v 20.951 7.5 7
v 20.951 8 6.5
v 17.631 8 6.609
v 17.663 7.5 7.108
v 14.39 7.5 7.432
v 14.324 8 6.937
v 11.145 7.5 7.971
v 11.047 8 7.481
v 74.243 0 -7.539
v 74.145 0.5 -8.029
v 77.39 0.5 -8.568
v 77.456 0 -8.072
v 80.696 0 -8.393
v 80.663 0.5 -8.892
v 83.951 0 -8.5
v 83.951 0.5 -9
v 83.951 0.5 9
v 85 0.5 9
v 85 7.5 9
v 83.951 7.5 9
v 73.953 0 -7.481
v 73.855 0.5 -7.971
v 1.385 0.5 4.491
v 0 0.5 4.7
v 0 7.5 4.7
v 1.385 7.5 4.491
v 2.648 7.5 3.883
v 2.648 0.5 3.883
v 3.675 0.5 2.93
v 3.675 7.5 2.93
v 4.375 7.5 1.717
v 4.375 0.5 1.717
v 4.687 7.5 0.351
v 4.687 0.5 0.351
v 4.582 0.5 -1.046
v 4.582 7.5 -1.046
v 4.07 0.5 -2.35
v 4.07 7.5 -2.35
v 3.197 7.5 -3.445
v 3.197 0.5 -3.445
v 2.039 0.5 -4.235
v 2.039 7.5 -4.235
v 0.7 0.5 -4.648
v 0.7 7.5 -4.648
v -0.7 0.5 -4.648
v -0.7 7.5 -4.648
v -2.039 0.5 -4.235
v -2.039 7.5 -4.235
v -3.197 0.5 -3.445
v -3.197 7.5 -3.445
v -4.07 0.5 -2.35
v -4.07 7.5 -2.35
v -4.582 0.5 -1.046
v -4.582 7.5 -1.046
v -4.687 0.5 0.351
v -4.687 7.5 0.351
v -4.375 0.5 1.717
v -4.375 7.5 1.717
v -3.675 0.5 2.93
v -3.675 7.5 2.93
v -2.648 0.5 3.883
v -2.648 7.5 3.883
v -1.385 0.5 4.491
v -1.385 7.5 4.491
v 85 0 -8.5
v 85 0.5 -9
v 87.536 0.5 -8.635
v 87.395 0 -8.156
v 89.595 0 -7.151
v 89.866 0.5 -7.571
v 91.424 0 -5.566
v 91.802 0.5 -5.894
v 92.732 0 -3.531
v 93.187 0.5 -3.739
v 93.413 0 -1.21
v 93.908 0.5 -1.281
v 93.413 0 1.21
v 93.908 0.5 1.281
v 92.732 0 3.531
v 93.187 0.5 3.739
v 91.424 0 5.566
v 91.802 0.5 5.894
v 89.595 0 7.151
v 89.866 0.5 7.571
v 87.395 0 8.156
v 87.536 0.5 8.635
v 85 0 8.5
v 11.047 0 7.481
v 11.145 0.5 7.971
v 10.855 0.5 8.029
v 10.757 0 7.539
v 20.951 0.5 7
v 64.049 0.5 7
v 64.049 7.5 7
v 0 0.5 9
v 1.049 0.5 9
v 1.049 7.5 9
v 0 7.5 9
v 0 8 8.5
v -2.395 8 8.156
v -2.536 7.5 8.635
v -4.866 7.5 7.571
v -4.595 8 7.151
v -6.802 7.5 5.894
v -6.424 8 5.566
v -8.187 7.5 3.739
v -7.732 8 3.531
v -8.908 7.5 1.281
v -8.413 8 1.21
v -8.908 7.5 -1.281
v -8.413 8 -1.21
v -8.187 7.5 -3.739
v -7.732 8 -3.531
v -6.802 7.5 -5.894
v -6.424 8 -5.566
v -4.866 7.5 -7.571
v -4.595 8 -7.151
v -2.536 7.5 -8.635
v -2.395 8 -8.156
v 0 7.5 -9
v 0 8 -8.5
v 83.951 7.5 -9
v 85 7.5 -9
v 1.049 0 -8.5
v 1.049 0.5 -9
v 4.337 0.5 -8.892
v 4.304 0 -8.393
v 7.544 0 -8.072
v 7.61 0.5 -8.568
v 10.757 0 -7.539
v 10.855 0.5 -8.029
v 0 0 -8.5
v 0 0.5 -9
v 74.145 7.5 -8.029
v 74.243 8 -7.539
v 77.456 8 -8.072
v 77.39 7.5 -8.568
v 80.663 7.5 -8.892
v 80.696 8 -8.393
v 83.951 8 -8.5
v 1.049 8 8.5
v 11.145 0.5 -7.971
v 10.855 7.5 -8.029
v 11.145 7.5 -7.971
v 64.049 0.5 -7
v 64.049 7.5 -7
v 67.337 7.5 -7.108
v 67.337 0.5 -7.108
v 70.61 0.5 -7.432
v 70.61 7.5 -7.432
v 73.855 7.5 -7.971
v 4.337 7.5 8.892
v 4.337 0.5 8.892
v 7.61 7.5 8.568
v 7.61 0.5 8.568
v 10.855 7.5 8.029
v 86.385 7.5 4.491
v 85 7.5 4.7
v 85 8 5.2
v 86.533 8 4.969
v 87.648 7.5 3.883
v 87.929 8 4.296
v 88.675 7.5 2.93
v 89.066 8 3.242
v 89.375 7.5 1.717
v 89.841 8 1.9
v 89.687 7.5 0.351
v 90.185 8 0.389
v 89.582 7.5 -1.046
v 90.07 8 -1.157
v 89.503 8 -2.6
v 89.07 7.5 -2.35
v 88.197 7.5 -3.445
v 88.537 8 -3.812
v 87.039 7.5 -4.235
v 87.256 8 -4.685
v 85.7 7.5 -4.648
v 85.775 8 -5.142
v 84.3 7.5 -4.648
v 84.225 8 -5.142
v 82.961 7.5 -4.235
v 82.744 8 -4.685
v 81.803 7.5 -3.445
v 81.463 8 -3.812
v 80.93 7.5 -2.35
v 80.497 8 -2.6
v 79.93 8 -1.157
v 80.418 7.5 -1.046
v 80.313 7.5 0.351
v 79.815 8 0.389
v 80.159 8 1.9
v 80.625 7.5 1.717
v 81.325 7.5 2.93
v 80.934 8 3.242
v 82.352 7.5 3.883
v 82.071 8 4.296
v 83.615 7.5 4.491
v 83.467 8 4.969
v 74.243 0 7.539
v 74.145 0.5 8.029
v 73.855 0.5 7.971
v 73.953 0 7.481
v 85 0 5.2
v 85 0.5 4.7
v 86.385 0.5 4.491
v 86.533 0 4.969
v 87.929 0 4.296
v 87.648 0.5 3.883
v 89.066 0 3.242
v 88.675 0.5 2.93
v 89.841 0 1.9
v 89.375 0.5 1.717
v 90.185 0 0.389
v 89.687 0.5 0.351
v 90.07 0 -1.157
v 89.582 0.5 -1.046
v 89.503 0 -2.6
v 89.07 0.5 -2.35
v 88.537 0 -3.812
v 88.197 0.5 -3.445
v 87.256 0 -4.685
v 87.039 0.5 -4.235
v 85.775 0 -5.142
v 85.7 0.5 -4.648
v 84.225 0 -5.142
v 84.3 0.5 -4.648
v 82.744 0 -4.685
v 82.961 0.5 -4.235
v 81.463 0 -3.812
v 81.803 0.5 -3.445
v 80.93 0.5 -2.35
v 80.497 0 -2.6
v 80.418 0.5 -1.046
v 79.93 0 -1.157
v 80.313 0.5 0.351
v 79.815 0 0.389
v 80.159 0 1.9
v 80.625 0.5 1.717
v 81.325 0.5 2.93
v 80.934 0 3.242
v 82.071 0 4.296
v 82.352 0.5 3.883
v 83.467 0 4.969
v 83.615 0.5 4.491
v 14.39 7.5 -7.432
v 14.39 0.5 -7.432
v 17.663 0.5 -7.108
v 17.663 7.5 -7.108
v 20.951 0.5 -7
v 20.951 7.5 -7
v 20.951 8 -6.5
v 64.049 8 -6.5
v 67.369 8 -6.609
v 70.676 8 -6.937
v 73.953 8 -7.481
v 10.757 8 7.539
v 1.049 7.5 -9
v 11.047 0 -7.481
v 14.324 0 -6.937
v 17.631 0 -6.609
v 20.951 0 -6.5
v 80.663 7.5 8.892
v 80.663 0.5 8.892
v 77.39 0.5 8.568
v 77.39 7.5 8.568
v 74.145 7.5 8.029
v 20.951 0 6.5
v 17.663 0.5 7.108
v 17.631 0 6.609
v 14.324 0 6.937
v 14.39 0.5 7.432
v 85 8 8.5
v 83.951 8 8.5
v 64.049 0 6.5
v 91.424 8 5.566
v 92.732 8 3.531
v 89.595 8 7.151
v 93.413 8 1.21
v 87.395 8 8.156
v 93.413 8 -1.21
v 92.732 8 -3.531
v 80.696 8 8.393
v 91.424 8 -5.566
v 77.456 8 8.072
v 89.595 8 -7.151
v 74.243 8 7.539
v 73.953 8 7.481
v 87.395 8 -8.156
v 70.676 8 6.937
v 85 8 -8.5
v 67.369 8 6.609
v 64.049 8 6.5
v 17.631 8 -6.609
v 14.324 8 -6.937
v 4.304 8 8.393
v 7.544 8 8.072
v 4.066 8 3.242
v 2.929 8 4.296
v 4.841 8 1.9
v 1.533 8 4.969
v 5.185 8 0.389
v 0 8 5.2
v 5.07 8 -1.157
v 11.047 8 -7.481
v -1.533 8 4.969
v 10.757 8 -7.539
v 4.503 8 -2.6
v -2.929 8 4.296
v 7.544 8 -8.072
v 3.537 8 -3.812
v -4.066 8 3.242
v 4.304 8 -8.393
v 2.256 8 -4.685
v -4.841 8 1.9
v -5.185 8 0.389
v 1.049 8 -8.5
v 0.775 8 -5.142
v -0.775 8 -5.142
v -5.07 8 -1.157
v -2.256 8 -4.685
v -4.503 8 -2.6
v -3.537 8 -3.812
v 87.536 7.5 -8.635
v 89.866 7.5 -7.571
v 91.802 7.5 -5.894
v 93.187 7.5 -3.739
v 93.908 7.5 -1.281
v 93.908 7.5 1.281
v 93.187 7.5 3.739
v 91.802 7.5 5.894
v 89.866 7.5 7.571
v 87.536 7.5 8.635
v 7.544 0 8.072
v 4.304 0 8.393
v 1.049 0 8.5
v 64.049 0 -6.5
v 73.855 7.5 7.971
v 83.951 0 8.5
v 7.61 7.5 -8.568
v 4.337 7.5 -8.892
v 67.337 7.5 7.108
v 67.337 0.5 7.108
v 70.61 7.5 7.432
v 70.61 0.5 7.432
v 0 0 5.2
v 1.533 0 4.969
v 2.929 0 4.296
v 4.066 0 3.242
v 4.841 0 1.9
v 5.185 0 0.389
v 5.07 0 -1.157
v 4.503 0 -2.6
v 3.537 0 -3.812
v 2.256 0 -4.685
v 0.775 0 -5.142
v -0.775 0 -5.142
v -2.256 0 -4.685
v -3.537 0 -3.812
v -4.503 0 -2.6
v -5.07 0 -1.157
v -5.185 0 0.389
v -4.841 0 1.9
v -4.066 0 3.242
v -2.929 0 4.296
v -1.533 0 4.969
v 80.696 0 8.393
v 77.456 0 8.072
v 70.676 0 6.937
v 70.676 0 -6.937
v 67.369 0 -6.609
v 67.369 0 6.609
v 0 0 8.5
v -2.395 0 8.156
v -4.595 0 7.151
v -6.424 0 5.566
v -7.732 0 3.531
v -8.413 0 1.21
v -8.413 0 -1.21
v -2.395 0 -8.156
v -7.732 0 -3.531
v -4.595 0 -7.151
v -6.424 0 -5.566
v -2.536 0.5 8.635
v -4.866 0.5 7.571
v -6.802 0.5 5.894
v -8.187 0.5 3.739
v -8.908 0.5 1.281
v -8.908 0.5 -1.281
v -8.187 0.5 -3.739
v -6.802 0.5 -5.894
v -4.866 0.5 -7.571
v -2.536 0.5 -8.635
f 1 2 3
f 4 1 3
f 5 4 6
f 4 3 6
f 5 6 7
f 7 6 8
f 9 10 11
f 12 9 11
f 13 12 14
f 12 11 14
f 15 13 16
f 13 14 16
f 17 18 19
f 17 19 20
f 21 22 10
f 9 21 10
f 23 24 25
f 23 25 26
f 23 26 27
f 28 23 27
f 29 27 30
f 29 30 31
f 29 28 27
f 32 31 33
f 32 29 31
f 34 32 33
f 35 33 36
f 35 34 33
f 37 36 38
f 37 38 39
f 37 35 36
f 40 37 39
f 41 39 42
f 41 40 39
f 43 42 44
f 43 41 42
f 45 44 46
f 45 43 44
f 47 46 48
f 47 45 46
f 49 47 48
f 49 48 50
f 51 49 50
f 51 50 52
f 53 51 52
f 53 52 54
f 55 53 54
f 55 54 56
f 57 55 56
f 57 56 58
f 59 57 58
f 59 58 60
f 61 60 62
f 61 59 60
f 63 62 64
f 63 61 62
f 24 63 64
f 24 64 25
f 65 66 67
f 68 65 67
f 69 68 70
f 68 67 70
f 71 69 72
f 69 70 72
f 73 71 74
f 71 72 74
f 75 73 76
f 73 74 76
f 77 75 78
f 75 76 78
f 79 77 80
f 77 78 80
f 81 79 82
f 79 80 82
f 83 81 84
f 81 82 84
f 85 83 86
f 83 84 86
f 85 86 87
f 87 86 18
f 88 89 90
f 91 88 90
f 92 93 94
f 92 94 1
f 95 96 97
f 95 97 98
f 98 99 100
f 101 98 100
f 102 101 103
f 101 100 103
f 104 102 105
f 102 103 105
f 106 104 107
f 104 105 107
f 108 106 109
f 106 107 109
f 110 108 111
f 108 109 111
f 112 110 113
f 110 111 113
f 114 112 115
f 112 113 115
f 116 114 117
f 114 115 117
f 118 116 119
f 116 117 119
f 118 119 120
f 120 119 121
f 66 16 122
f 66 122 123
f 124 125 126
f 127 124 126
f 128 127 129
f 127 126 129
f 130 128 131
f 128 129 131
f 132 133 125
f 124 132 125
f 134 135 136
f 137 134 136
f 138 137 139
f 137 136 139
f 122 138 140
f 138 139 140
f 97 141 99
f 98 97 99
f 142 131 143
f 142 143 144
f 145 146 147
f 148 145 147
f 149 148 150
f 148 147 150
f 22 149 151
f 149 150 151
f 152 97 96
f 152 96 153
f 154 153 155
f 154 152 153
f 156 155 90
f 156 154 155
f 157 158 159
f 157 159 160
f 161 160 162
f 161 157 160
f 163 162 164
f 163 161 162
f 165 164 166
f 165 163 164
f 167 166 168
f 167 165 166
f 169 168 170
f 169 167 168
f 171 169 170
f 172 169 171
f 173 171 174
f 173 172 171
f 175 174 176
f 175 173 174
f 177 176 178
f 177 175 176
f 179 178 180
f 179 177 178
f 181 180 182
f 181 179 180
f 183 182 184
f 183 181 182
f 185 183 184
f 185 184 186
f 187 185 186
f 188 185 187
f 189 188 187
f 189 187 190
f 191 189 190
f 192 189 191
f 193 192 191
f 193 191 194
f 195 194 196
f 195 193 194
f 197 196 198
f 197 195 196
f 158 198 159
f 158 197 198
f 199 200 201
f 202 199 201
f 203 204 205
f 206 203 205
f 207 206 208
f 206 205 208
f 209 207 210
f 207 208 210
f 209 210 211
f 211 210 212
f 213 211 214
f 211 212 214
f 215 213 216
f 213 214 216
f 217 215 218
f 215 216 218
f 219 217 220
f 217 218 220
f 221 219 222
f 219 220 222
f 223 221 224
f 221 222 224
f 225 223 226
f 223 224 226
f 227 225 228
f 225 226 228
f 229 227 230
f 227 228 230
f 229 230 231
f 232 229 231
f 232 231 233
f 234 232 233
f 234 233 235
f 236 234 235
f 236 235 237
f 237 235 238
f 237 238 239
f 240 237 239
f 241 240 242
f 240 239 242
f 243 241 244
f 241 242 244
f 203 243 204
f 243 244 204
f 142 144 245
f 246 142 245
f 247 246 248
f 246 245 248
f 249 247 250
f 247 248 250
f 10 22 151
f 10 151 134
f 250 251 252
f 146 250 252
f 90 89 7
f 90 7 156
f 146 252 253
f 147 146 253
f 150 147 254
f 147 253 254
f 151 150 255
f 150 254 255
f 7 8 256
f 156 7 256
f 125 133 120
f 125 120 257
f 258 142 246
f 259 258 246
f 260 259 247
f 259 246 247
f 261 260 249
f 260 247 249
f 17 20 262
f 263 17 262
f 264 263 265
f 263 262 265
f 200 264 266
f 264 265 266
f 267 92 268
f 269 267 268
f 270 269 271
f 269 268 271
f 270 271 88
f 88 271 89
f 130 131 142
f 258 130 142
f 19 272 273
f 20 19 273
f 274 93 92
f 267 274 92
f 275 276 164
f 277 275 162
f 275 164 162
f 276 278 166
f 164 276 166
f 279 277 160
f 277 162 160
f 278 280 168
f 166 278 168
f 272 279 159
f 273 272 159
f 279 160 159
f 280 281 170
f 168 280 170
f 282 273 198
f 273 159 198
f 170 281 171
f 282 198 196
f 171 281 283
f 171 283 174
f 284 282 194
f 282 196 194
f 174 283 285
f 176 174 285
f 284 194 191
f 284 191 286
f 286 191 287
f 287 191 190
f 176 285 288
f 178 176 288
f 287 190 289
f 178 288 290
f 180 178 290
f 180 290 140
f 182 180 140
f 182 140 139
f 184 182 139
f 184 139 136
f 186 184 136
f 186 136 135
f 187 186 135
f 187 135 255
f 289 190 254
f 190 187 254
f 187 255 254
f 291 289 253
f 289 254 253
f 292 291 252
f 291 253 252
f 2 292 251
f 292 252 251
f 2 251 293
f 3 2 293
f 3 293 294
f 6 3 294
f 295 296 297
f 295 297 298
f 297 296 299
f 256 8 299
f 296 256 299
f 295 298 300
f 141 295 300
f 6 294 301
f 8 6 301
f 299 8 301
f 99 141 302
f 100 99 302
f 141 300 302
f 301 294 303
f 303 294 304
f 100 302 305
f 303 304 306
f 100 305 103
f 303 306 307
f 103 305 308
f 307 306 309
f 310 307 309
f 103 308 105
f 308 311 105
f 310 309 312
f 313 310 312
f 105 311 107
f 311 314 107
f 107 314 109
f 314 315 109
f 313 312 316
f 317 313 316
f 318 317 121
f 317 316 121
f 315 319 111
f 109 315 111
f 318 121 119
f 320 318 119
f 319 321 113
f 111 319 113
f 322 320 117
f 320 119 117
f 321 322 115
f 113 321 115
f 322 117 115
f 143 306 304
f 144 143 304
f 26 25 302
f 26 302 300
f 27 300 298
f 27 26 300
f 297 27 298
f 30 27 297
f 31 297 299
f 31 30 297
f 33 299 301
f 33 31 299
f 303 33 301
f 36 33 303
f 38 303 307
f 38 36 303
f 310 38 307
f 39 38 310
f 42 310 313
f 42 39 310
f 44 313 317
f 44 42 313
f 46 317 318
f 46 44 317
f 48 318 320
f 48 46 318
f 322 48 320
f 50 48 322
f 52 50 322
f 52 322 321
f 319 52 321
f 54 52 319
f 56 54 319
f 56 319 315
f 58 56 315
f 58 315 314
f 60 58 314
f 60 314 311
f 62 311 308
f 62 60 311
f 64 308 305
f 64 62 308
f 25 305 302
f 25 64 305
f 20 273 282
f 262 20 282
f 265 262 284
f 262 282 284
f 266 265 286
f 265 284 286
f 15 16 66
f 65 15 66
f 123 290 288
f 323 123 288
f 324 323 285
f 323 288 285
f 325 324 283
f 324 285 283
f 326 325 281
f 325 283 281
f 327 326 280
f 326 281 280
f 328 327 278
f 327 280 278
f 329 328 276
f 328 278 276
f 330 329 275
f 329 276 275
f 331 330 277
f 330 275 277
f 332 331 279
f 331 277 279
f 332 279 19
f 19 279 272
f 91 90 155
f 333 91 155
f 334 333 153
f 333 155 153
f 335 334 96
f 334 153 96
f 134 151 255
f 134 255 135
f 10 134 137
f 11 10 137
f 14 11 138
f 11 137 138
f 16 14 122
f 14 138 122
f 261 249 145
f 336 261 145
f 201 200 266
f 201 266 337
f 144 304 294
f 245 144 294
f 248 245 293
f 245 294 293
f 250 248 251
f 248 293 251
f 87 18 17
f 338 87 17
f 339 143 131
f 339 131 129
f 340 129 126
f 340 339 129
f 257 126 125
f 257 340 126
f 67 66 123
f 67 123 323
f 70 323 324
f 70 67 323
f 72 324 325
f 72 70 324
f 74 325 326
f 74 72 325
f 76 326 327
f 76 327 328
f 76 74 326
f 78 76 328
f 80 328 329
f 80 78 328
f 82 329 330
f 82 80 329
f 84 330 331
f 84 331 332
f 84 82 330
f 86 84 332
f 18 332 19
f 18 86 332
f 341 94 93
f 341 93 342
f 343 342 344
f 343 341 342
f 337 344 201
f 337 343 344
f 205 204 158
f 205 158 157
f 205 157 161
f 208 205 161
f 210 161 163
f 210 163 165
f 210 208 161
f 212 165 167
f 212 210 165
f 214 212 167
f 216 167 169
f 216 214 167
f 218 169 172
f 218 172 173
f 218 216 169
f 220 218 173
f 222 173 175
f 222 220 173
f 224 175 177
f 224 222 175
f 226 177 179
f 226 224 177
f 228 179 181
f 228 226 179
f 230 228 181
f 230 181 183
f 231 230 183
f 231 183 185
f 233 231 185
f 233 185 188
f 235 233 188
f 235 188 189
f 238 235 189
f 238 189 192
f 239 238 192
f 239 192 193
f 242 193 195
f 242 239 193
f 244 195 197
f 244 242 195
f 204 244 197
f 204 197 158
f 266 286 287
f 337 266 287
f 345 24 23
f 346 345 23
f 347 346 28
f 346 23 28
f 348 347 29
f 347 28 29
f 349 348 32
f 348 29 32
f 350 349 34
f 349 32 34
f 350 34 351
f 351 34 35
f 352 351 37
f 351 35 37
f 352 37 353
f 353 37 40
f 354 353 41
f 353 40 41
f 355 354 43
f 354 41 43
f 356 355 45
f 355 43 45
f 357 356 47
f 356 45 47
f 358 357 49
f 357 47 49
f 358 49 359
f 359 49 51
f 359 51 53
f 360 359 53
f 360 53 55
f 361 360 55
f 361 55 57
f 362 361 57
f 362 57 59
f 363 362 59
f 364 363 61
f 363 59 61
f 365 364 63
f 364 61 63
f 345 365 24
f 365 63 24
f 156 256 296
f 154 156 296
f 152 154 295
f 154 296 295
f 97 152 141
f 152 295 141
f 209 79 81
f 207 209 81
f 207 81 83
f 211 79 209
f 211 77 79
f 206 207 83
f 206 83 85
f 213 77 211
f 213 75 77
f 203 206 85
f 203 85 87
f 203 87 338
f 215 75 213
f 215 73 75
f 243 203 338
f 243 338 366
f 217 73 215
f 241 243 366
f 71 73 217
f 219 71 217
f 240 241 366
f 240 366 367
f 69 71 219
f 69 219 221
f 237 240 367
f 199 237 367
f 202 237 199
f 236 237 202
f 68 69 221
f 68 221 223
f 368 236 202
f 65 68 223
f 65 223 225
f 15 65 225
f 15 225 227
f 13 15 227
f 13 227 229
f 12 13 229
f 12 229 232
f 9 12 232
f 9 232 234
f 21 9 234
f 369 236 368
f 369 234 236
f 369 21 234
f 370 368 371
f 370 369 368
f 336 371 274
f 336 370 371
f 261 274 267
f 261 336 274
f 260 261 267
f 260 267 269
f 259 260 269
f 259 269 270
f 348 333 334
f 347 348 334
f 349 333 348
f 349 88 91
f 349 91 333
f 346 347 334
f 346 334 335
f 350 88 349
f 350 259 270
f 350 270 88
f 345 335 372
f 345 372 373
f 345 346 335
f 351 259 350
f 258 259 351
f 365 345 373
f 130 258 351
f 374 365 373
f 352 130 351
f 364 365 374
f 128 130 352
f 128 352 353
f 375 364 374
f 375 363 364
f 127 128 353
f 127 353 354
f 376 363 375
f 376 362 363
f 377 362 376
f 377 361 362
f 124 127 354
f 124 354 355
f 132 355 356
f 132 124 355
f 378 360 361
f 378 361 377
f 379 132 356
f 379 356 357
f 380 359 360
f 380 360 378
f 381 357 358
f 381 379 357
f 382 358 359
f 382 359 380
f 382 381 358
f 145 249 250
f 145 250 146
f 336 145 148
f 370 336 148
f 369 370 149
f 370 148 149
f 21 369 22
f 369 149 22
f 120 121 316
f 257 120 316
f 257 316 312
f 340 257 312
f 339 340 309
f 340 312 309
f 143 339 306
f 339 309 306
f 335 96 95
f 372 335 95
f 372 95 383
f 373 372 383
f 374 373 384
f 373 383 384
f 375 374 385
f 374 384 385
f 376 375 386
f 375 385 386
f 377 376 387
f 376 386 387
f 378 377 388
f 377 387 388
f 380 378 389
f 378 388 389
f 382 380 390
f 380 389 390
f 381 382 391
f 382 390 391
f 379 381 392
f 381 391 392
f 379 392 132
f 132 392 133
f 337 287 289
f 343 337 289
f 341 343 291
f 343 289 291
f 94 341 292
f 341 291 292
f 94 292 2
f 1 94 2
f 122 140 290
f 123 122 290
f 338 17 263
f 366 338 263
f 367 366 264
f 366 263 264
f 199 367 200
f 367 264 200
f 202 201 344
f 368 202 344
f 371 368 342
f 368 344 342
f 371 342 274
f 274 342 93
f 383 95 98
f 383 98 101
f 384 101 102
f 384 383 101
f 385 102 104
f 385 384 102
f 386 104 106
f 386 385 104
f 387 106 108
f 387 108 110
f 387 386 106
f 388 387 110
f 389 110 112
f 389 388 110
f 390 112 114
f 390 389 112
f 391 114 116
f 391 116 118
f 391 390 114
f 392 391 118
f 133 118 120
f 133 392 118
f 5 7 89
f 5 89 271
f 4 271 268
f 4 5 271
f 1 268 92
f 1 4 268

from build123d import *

# Parameters (mm, degrees)
SKETCH1_R           = 4.7
BOSS_EXTRUDE1_DEPTH = 8
FILLET1_R           = 50
FILLET2_R           = 50
CHAMFER1_SIZE       = 0.5
CHAMFER2_SIZE       = 0.5


with BuildPart() as part:
    # Sketch1 → Boss-Extrude1 (new body)
    with BuildSketch(Plane(origin=(0, 0, 0), x_dir=(1, 0, 0), z_dir=(0, 1, 0))):
        with BuildLine():
            Line((6, 9), (16, 7))
            Line((16, 7), (69, 7))
            Line((69, 7), (79, 9))
            Line((79, 9), (85, 9))
            ThreePointArc((85, 9), (94, 0), (85, -9))
            Line((85, -9), (79, -9))
            Line((79, -9), (69, -7))
            Line((69, -7), (16, -7))
            Line((16, -7), (6, -9))
            Line((6, -9), (0, -9))
            ThreePointArc((0, -9), (-9, 0), (0, 9))
            Line((0, 9), (6, 9))
        make_face()
        with Locations(Location((0, 0, 0), (0, 0, 270))):
            Circle(SKETCH1_R, mode=Mode.SUBTRACT)
        with Locations(Location((85, 0, 0), (0, 0, 270))):
            Circle(SKETCH1_R, mode=Mode.SUBTRACT)
    extrude(amount=BOSS_EXTRUDE1_DEPTH)

    # Fillet1
    fillet1_edges = [part.edges().sort_by_distance(p)[0] for p in [
        (16, 4, -7),
        (69, 4, -7),
        (69, 4, 7),
        (16, 4, 7),
    ]]
    fillet(fillet1_edges, radius=FILLET1_R)

    # Fillet2
    fillet2_edges = [part.edges().sort_by_distance(p)[0] for p in [
        (6, 4, 9),
        (6, 4, -9),
        (79, 4, -9),
        (79, 4, 9),
    ]]
    fillet(fillet2_edges, radius=FILLET2_R)

    # Chamfer1
    chamfer1_edges = [part.edges().sort_by_distance(p)[0] for p in [
        (0, 0, -4.7),
        (0, 8, -4.7),
        (85, 0, -4.7),
        (85, 8, -4.7),
    ]]
    chamfer(chamfer1_edges, length=CHAMFER1_SIZE)

    # Chamfer2
    chamfer2_edges = [part.edges().sort_by_distance(p)[0] for p in [
        (0.52451216, 0, 9),
        (-9, 0, 0),
        (84.47548784, 0, -9),
        (94, 0, 0),
        (94, 8, 0),
        (84.47548784, 8, -9),
        (74, 0, 8),
        (-9, 8, 0),
        (74, 8, 8),
        (42.5, 0, 7),
        (42.5, 8, 7),
        (0.52451216, 8, 9),
        (42.5, 0, -7),
        (42.5, 8, -7),
        (11, 0, -8),
        (11, 8, -8),
        (68.975905219, 0, 7.243333667),
        (68.975905219, 8, 7.243333667),
        (16.024094781, 0, 7.243333667),
        (16.024094781, 8, 7.243333667),
        (68.975905219, 0, -7.243333667),
        (68.975905219, 8, -7.243333667),
        (16.024094781, 0, -7.243333667),
        (16.024094781, 8, -7.243333667),
        (74, 0, -8),
        (74, 8, -8),
        (11, 0, 8),
        (0.52451216, 0, -9),
        (84.47548784, 0, 9),
        (5.975905219, 0, 8.756666333),
        (79.024094781, 0, 8.756666333),
        (5.975905219, 0, -8.756666333),
        (79.024094781, 0, -8.756666333),
        (11, 8, 8),
        (84.47548784, 8, 9),
        (0.52451216, 8, -9),
        (5.975905219, 8, 8.756666333),
        (79.024094781, 8, 8.756666333),
        (5.975905219, 8, -8.756666333),
        (79.024094781, 8, -8.756666333),
    ]]
    chamfer(chamfer2_edges, length=CHAMFER2_SIZE)


solid = part.part
